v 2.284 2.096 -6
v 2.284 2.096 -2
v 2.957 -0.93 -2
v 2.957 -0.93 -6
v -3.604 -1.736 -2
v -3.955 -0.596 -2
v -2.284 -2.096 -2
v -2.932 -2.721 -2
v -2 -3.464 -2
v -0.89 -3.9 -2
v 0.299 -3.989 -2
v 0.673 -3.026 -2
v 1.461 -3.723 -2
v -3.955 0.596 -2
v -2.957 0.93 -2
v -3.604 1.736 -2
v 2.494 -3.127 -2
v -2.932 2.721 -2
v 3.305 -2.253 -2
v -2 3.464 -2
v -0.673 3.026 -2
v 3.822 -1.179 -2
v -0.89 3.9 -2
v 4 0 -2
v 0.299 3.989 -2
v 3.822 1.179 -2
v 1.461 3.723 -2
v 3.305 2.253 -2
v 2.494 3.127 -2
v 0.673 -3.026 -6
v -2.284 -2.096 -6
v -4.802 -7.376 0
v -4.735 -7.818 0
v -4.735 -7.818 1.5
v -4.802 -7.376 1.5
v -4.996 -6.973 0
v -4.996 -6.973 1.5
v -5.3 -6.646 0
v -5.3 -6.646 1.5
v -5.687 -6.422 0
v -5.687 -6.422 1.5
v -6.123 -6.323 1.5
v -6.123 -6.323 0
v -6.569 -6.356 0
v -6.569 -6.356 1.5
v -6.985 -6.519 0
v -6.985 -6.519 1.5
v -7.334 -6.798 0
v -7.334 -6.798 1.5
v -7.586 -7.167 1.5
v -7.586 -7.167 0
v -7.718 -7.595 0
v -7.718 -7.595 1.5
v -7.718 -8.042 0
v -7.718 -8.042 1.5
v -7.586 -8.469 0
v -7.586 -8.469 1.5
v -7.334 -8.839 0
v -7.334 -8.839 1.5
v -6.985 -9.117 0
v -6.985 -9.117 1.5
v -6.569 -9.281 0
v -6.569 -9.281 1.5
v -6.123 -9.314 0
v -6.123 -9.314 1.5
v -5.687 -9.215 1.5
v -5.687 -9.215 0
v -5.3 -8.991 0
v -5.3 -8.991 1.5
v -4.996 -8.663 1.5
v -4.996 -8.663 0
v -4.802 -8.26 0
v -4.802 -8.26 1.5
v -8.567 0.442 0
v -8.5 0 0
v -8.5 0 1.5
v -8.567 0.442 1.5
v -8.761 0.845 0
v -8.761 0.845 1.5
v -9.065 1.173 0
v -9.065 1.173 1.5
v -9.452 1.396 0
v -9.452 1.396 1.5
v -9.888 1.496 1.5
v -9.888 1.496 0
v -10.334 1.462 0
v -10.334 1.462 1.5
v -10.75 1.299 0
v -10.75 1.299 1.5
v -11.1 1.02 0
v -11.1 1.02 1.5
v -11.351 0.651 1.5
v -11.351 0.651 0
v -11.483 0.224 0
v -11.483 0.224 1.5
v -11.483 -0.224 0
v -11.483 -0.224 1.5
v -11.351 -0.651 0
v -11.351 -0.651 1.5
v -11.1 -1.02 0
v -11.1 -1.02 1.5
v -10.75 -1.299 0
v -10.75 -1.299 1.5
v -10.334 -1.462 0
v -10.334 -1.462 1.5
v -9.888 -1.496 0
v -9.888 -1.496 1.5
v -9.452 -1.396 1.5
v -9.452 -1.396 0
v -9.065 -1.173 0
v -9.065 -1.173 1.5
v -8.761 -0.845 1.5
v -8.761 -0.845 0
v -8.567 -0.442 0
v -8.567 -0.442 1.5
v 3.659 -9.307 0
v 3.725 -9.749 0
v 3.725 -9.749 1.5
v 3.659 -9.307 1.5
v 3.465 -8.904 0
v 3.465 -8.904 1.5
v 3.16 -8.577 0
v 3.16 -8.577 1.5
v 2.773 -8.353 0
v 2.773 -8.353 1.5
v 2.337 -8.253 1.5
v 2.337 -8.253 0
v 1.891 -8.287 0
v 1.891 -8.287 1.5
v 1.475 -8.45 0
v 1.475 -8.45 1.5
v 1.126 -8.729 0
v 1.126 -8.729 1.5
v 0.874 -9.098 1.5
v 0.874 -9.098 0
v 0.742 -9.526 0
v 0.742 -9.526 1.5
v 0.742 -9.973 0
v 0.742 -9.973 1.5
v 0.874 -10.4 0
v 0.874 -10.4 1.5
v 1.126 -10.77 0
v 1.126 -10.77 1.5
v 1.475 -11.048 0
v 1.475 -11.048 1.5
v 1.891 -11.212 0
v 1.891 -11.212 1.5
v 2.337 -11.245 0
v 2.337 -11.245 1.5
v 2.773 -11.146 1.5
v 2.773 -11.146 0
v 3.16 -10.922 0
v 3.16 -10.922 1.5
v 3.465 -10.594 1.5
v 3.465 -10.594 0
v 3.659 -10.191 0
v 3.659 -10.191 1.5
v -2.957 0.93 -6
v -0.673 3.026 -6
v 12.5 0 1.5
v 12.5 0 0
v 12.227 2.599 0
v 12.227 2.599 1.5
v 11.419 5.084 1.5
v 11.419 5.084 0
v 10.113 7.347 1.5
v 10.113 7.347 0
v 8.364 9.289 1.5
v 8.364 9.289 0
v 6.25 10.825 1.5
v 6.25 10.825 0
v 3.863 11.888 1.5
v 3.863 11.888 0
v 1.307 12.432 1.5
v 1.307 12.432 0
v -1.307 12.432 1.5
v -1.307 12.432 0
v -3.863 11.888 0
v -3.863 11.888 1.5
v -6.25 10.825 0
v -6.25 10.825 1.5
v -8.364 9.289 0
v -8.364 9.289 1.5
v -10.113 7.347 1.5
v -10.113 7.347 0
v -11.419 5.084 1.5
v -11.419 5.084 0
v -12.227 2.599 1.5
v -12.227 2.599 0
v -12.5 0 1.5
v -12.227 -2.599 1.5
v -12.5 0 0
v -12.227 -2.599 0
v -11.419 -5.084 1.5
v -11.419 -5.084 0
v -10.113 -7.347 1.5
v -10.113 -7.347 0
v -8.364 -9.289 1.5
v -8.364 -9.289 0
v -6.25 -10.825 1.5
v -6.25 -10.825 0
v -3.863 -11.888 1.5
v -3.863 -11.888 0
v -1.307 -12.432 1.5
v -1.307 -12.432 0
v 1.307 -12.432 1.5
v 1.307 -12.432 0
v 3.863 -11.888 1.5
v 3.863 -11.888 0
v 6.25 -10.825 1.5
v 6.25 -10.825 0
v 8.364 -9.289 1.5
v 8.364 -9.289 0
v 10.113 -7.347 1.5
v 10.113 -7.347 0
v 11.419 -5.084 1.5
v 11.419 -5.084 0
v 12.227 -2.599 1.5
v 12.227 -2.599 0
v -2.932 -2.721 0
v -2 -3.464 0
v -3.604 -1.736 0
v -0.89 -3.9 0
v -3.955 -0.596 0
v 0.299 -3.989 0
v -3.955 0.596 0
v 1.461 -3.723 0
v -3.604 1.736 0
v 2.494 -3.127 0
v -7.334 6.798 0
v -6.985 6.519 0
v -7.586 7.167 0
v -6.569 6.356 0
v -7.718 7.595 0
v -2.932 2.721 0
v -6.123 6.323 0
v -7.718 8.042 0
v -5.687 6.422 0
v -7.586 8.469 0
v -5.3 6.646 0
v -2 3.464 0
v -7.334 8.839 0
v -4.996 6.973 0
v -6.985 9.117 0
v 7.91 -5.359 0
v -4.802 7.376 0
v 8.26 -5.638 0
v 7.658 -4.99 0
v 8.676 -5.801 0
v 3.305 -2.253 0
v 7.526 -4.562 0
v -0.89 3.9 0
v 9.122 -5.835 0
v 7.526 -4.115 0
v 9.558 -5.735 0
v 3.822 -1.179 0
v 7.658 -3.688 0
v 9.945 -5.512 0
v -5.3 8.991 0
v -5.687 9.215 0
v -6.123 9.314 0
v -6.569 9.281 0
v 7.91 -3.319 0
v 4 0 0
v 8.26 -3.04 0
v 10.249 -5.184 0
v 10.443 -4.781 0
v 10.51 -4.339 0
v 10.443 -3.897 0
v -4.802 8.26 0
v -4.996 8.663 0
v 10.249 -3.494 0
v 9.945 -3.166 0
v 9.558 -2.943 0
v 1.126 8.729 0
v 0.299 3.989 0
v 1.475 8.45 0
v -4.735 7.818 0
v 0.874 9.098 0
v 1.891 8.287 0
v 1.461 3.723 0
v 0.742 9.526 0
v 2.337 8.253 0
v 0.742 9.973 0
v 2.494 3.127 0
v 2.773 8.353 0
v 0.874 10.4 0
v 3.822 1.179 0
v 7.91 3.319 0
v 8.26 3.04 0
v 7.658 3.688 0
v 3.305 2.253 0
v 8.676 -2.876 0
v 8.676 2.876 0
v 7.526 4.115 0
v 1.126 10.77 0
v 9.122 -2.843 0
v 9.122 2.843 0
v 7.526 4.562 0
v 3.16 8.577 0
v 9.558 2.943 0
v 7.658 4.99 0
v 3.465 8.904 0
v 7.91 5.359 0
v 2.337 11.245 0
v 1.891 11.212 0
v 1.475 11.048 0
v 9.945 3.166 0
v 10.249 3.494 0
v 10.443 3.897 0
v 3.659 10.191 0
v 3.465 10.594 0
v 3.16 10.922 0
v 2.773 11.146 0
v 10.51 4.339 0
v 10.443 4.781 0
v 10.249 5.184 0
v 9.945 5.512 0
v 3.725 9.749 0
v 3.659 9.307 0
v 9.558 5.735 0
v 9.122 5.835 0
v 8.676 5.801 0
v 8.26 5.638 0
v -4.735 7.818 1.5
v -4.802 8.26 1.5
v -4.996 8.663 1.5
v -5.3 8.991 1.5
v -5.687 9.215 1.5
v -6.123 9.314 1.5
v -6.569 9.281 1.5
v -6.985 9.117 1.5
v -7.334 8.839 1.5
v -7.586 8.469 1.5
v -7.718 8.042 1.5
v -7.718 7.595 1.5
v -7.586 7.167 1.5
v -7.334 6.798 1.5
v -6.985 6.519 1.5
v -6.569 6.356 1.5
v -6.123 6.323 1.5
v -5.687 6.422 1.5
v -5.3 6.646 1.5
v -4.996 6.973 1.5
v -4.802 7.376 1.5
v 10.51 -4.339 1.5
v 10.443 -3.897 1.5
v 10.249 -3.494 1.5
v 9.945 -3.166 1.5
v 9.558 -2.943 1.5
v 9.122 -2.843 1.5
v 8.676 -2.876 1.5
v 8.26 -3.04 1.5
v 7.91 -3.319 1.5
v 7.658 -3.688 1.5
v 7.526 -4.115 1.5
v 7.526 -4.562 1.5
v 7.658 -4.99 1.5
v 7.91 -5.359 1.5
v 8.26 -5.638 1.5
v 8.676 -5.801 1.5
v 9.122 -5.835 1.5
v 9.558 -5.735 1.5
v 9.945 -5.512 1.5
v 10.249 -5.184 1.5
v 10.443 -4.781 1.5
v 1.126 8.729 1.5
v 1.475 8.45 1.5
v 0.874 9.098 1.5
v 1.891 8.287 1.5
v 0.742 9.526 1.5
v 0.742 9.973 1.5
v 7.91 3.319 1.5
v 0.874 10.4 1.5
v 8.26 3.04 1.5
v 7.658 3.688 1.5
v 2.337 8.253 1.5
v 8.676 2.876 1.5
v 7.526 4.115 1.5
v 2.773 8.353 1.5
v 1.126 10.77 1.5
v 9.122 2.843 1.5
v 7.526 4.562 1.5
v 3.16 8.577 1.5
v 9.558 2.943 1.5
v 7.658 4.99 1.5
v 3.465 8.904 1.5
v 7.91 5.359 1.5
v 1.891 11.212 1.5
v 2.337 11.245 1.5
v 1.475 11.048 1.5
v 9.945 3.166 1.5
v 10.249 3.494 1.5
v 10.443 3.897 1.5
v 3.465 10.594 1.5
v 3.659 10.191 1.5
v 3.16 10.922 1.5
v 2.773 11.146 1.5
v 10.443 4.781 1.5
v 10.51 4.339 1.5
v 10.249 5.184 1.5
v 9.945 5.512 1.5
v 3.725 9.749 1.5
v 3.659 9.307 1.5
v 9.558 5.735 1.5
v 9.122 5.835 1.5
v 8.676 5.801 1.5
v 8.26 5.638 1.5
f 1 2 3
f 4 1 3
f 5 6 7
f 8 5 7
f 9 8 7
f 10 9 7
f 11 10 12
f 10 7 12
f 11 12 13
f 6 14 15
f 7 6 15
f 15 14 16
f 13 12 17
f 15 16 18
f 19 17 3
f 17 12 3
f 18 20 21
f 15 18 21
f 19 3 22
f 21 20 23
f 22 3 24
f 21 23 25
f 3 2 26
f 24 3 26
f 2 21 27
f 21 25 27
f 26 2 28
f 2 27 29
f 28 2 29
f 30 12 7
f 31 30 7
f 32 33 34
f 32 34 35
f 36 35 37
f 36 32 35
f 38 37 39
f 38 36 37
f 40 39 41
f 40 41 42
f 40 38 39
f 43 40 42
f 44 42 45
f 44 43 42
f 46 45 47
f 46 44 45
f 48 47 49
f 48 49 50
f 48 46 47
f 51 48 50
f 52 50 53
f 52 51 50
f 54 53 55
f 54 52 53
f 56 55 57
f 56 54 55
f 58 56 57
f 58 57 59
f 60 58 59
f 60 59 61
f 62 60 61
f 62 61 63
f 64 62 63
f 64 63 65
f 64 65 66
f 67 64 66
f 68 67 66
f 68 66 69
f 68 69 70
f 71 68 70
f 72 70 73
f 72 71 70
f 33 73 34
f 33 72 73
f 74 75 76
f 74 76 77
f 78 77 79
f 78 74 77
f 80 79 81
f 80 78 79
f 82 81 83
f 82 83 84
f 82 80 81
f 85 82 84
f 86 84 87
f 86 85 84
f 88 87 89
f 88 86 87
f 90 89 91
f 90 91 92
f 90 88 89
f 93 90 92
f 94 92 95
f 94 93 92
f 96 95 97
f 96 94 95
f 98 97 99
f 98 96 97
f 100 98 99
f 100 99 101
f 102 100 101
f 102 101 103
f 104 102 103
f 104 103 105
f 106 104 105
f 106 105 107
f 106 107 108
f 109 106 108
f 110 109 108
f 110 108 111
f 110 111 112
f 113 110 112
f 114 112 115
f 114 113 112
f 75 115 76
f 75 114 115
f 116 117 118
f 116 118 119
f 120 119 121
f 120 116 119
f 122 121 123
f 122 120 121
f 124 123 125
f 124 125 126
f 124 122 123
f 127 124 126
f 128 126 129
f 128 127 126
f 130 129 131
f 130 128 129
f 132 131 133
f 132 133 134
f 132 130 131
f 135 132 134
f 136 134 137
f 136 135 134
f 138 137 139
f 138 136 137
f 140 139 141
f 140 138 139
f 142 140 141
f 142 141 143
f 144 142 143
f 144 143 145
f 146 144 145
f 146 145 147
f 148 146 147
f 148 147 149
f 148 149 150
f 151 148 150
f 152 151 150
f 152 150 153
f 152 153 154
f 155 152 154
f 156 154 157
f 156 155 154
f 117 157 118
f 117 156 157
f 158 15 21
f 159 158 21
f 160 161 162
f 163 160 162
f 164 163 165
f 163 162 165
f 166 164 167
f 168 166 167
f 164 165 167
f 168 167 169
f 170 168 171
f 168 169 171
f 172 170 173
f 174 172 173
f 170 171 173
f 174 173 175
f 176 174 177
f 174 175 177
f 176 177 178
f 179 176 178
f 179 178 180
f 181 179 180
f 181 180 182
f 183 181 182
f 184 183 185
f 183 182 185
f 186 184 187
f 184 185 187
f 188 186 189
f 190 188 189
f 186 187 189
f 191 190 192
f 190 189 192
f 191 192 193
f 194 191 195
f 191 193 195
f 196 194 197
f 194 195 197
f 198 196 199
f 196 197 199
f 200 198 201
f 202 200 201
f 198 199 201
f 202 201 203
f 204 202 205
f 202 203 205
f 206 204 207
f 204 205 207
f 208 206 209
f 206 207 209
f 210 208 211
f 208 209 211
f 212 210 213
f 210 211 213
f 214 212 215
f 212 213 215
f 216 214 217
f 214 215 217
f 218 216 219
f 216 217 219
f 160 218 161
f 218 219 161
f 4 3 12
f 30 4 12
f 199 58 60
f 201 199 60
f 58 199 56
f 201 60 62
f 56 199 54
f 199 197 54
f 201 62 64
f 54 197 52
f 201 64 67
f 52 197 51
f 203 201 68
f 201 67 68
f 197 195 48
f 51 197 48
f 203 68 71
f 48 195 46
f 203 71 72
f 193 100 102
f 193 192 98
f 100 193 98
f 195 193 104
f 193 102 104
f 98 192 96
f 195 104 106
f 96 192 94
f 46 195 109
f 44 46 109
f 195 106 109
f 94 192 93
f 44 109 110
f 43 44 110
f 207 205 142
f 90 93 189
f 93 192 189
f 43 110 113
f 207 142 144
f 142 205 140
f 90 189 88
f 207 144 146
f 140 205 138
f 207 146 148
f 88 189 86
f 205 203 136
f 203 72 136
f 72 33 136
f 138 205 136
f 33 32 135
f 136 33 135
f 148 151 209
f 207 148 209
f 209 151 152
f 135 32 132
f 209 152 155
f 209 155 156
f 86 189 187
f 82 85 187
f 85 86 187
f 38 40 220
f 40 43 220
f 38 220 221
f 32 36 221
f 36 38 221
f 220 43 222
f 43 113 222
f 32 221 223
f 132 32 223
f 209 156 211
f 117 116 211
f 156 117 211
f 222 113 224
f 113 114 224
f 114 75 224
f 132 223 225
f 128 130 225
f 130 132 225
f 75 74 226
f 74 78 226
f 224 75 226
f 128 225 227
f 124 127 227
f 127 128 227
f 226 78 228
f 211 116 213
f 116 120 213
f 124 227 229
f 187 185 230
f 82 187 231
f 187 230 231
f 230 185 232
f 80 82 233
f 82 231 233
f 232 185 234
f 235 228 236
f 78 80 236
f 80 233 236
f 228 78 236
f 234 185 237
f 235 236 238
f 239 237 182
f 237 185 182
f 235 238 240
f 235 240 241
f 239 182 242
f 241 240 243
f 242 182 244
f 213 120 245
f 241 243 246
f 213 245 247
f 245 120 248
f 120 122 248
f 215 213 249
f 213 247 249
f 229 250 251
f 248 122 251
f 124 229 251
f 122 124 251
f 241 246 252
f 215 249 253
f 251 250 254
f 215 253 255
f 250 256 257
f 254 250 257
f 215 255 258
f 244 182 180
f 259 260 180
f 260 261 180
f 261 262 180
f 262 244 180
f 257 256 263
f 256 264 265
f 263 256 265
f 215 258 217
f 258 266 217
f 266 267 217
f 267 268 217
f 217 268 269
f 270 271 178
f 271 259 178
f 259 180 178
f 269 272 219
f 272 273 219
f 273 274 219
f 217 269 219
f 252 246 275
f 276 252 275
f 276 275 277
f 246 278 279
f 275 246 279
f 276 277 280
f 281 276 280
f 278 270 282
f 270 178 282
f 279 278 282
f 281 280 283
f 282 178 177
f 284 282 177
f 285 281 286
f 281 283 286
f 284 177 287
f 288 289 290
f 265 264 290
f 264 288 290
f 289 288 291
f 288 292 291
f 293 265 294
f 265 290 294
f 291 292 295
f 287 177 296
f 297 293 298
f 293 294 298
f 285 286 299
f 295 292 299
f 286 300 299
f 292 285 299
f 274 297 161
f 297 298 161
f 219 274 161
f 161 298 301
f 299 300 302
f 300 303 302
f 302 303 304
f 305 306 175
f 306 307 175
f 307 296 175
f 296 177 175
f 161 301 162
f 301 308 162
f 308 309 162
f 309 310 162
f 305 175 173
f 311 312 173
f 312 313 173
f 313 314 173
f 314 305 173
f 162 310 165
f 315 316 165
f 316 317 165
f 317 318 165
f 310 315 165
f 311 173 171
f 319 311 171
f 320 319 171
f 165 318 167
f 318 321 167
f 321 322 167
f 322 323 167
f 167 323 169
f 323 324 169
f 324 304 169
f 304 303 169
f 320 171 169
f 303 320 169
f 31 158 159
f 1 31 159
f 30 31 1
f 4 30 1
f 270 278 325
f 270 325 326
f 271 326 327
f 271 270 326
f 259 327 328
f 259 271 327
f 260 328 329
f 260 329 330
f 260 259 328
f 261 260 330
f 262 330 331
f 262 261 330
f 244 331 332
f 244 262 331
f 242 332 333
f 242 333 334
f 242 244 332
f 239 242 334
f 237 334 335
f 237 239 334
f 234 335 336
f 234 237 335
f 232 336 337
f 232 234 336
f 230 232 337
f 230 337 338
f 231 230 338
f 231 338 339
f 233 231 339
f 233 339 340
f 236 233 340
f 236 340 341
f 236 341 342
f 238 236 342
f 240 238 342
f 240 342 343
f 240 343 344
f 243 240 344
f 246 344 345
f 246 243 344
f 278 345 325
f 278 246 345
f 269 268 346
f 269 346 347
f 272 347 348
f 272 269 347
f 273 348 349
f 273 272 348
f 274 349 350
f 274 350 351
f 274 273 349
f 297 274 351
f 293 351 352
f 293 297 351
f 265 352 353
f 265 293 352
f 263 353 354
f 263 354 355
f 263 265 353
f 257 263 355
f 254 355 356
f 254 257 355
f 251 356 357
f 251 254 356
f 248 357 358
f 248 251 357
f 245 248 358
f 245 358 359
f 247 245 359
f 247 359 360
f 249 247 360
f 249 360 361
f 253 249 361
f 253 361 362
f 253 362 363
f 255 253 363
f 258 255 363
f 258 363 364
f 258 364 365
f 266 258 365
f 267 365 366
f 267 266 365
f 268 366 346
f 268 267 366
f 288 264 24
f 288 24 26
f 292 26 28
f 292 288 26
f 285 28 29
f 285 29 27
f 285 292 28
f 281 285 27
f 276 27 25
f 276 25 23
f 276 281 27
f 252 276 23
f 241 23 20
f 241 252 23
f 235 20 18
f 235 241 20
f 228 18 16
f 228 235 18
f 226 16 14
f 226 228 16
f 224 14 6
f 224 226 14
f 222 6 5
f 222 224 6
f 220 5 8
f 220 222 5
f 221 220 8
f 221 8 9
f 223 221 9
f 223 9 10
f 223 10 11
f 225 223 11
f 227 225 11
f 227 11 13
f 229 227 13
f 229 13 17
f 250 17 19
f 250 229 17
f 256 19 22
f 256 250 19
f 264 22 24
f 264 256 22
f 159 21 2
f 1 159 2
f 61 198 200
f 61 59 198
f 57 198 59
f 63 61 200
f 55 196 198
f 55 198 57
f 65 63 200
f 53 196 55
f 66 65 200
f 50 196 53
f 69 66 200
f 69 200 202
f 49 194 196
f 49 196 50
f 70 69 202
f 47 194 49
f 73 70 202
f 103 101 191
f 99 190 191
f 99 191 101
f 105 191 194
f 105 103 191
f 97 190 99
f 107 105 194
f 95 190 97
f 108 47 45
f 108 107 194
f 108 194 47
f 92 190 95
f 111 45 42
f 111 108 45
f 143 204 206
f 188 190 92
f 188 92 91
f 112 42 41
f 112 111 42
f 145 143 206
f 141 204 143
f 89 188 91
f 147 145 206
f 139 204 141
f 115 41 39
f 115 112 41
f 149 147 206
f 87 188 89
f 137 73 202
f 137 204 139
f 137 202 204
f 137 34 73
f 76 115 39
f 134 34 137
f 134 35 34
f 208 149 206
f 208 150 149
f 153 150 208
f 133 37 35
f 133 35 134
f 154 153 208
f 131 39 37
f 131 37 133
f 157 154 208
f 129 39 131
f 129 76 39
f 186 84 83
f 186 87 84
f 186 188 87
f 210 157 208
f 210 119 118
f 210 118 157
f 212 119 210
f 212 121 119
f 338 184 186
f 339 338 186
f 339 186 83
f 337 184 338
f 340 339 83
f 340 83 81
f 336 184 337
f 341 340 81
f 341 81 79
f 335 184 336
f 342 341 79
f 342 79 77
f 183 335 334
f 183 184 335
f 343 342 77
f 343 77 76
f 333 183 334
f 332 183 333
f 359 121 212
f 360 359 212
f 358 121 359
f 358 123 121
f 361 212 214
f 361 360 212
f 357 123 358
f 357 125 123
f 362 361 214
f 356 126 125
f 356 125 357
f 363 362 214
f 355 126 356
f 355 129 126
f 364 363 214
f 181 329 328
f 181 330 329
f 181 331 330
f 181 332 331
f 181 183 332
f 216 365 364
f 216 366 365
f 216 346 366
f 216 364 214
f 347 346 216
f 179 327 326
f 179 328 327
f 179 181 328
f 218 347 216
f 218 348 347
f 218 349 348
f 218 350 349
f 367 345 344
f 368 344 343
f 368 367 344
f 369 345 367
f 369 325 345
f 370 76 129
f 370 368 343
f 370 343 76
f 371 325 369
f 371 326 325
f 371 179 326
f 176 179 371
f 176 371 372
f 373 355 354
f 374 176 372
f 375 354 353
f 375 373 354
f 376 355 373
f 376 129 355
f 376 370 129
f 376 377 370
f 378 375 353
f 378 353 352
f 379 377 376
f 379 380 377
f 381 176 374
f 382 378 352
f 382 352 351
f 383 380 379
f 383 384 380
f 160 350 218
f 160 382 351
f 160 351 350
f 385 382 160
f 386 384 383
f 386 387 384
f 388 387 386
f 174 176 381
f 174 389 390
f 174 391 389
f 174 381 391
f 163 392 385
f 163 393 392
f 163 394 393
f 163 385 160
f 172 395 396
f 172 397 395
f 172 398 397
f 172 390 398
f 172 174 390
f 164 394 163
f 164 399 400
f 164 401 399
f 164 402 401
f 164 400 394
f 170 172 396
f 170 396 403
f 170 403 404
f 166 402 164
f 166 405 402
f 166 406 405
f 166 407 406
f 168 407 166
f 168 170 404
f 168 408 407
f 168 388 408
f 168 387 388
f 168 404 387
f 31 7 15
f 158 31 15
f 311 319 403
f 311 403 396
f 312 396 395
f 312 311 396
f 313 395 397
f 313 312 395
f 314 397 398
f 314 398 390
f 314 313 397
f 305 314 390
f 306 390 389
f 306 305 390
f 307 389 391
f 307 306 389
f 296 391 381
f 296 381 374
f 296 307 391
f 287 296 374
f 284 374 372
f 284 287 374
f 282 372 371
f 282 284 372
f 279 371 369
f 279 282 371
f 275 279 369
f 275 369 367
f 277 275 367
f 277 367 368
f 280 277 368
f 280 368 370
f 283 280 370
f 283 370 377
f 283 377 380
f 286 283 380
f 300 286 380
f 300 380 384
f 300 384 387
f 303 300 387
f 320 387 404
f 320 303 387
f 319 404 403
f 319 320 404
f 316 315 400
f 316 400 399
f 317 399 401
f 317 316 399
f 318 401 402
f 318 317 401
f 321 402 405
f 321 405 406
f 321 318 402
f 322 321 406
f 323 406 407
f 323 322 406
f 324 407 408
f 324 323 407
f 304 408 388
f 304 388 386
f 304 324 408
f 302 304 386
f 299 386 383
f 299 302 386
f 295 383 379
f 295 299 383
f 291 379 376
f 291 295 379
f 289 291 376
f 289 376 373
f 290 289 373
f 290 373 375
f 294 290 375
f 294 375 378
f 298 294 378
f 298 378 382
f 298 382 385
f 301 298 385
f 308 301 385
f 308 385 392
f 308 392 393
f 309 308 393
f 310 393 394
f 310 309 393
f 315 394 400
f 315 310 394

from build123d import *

# Parameters (mm, degrees)
F0_R     = 12.5
F0_R_2   = 1.5
F0_R_3   = 4
F1_DEPTH = 1.5
F2_DEPTH = 2
F4_DEPTH = 4


with BuildPart() as f1:
    # F0 (on Top) → F1 (new body)
    with BuildSketch(Plane.XY):
        Circle(F0_R)
        with Locations((-6.234898, -7.818315)):
            Circle(F0_R_2, mode=Mode.SUBTRACT)
        with Locations((2.225209, -9.749279)):
            Circle(F0_R_2, mode=Mode.SUBTRACT)
        with Locations((9.009689, -4.338837)):
            Circle(F0_R_2, mode=Mode.SUBTRACT)
        with Locations((-10, 0)):
            Circle(F0_R_2, mode=Mode.SUBTRACT)
        with Locations((-6.234898, 7.818315)):
            Circle(F0_R_2, mode=Mode.SUBTRACT)
        Circle(F0_R_3, mode=Mode.SUBTRACT)
        with Locations((9.009689, 4.338837)):
            Circle(F0_R_2, mode=Mode.SUBTRACT)
        with Locations((2.225209, 9.749279)):
            Circle(F0_R_2, mode=Mode.SUBTRACT)
        Circle(F0_R_3)
    extrude(amount=F1_DEPTH)

    # F0 (on Top) → F2 (join)
    with BuildSketch(Plane.XY):
        Circle(F0_R_3)
    extrude(amount=-F2_DEPTH)

    # F3 (on face) → F4 (join)
    with BuildSketch(Plane(origin=(0, 0, -2), x_dir=(1, 0, 0), z_dir=(0, 0, -1))):
        Polygon((-0.672768, -3.026117), (2.28431, -2.095692), (2.957078, 0.930425), (0.672768, 3.026117), (-2.28431, 2.095692), (-2.957078, -0.930425), align=None)
    extrude(amount=F4_DEPTH)


solid = f1.part
